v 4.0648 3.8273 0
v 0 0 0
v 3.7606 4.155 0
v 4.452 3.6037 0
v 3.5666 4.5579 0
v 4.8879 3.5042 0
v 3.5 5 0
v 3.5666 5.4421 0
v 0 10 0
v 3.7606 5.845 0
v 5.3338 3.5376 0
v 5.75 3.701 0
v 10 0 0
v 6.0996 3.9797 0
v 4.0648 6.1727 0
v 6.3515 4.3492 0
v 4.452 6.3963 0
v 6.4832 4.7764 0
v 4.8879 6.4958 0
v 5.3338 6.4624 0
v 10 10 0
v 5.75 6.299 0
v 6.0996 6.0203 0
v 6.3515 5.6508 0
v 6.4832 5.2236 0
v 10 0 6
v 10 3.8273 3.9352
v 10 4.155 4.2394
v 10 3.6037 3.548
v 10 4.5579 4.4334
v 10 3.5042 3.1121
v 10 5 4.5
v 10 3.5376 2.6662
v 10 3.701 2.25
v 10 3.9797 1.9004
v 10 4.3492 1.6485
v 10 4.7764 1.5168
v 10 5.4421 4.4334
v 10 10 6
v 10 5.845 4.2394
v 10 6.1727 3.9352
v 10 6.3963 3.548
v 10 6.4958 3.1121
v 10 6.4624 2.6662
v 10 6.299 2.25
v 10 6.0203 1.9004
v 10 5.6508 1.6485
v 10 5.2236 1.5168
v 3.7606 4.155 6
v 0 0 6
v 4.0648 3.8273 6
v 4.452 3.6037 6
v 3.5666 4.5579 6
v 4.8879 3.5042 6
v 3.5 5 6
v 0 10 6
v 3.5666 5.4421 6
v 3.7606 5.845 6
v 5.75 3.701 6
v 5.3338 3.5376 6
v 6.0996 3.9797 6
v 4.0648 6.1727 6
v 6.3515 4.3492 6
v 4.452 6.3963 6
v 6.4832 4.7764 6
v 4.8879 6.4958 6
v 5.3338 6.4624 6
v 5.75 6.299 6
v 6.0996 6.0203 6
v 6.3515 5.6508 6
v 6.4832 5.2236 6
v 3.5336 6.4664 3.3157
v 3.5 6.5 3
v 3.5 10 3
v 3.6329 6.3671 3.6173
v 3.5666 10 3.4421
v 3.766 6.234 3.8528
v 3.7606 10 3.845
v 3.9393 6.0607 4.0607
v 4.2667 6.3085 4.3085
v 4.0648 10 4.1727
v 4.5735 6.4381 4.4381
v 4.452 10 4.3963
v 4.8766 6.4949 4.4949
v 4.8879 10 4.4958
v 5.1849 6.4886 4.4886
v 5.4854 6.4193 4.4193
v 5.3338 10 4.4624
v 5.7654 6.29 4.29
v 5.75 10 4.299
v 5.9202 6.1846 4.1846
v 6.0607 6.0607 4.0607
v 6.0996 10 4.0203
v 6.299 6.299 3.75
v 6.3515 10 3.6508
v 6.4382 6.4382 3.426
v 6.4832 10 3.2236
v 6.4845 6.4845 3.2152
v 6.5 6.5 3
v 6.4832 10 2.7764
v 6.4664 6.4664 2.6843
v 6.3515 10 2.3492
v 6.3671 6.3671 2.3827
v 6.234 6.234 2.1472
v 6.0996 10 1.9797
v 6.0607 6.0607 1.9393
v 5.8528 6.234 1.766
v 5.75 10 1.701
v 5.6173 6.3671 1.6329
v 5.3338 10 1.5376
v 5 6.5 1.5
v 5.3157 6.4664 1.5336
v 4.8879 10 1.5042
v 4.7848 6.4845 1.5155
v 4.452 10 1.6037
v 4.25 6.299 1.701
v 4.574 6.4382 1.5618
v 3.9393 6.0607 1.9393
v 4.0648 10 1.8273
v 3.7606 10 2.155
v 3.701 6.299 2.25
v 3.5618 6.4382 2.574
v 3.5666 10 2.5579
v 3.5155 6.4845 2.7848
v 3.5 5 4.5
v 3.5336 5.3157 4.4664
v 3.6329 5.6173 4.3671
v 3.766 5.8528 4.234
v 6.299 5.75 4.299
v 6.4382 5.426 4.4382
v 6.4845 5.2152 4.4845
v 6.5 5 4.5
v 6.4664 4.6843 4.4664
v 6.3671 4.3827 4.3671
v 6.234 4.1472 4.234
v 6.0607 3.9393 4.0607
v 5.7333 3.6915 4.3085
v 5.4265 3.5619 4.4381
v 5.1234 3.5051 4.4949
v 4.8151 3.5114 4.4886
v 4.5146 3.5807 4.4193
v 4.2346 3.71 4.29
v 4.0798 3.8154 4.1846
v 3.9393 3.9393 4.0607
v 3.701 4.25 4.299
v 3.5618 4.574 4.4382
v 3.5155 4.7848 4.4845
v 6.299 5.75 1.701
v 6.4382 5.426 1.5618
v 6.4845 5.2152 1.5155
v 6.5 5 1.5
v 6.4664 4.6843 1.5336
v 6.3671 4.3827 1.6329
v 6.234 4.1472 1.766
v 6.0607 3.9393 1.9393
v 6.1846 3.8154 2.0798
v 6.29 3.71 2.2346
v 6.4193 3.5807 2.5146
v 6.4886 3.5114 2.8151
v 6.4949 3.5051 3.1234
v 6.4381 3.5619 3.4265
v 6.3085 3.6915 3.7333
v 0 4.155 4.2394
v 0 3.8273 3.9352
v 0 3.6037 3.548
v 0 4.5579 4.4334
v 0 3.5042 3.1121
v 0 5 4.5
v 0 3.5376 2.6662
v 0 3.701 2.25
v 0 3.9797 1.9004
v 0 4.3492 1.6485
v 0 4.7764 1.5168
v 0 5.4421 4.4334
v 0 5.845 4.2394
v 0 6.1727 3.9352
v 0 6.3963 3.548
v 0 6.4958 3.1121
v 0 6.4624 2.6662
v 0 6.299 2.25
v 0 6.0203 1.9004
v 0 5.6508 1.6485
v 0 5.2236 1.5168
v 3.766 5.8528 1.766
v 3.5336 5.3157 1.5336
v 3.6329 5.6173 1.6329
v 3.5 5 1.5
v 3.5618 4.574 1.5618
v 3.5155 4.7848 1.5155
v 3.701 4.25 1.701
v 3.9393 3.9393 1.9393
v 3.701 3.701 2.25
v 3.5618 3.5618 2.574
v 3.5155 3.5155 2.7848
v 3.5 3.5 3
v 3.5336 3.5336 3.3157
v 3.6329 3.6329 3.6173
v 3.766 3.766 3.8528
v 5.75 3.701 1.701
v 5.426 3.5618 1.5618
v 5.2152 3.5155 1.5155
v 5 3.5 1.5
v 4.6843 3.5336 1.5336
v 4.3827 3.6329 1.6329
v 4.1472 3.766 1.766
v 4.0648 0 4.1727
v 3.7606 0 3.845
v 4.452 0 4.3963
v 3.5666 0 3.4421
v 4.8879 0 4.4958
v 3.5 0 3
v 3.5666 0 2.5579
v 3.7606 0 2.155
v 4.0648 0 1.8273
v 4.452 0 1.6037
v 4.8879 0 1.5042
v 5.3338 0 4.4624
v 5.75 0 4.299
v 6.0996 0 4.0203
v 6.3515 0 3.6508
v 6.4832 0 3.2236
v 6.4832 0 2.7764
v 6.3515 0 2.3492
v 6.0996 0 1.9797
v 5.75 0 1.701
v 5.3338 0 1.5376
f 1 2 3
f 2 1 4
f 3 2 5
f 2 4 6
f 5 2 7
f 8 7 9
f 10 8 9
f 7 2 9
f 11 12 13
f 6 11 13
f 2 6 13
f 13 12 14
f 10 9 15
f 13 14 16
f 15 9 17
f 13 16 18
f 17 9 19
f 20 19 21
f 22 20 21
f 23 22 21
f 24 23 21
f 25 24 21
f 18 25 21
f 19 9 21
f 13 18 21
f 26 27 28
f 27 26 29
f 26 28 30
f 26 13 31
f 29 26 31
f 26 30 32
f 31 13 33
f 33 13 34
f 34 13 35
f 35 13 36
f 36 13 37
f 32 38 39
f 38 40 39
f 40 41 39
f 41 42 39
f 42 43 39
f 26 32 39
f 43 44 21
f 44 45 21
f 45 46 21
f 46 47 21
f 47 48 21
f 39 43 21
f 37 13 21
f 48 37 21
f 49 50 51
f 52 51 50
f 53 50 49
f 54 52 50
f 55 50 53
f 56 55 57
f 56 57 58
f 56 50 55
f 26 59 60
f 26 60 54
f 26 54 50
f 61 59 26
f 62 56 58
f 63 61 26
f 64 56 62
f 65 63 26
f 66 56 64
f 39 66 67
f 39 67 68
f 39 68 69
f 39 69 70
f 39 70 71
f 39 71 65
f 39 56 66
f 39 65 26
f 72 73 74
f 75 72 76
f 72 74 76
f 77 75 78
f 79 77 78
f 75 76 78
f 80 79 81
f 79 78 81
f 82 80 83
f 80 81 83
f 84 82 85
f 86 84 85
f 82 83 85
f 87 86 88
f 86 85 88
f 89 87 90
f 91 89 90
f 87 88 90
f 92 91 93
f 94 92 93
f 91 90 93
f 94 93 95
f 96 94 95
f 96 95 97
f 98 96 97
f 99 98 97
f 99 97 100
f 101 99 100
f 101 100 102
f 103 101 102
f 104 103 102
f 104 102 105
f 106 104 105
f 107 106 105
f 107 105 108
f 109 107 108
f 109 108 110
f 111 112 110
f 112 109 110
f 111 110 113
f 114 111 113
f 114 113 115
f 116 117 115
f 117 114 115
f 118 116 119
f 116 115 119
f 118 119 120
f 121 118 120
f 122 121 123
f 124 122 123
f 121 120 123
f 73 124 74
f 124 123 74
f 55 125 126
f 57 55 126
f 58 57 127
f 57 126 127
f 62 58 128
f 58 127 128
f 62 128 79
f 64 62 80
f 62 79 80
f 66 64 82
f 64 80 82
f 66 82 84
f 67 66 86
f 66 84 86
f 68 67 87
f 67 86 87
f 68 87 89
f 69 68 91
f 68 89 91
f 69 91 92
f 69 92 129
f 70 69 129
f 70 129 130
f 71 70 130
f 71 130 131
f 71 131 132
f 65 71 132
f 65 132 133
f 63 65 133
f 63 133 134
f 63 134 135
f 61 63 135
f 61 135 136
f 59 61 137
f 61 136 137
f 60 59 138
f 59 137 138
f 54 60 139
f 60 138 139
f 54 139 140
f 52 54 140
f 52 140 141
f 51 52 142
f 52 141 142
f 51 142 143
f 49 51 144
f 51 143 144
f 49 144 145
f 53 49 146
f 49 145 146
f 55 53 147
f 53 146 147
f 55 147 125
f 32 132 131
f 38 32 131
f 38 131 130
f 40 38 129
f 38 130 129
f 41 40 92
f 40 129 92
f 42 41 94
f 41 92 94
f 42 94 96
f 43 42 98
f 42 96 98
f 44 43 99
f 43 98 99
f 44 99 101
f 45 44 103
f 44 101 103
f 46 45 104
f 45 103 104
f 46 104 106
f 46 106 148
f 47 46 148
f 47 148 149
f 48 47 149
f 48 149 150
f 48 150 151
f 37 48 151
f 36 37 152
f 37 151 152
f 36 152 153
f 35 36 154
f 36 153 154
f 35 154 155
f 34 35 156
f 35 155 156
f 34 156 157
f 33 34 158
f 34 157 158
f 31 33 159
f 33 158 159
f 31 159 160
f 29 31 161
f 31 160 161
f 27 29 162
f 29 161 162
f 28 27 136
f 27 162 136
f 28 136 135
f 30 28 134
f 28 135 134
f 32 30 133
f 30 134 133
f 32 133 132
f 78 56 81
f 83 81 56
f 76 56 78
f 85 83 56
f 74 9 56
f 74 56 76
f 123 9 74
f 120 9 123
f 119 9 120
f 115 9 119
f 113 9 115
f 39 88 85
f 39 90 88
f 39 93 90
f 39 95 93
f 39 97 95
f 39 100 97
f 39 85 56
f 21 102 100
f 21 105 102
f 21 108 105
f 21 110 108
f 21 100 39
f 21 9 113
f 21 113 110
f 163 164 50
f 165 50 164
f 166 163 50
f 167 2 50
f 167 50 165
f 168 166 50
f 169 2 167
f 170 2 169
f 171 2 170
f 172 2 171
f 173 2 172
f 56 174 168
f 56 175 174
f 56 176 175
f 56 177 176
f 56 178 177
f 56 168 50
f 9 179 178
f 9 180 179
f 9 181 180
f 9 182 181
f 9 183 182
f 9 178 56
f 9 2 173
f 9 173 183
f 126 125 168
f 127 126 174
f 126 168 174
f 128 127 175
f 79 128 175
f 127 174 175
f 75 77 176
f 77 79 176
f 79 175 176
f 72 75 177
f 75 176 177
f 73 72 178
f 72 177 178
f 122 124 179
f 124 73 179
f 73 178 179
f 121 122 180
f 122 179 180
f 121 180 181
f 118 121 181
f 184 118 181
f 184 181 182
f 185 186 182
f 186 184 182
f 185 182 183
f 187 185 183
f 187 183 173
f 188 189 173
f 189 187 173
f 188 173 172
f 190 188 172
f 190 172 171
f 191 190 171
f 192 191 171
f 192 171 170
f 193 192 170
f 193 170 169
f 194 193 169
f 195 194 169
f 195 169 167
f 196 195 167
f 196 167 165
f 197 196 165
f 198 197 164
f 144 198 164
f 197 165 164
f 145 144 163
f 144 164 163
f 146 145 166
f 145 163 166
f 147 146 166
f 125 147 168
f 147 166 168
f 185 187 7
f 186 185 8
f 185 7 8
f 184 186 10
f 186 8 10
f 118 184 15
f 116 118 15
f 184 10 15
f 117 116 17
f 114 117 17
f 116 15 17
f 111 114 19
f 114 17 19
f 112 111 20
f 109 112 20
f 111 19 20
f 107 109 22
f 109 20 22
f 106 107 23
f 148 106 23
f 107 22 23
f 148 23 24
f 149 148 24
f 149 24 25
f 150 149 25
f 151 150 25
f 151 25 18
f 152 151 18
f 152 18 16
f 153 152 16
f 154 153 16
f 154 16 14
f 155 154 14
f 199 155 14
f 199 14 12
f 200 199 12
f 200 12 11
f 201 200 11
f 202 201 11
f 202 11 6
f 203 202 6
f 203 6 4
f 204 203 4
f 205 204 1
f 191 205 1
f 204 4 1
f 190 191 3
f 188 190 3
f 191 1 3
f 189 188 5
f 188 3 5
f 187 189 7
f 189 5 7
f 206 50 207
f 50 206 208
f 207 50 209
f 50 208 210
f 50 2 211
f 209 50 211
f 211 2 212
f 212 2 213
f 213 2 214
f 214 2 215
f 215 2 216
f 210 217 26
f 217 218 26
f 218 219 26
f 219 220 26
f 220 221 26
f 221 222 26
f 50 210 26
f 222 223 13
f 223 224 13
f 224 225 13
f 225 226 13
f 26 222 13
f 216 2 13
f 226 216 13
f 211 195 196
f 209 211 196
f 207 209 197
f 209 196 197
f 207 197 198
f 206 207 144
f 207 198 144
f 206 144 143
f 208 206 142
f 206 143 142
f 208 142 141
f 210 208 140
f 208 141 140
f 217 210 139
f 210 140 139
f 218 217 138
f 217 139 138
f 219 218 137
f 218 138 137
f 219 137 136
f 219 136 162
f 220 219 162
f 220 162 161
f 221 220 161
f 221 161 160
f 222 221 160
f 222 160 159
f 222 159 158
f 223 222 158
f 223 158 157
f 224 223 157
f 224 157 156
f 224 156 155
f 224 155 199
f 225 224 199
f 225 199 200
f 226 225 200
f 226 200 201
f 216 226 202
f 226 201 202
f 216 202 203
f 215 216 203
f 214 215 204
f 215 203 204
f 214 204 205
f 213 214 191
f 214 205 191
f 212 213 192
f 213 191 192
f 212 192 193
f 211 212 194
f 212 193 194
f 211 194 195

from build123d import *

# Parameters (mm, degrees)
SKETCH_1_W          = 10
SKETCH_1_H          = 10
EXTRUDE_1_DEPTH     = 6
SKETCH_2_R          = 1.5
CUT_EXTRUDE_1_DEPTH = 16.362291496
SKETCH_3_R          = 1.5
CUT_EXTRUDE_2_DEPTH = 16.362291496
SKETCH_4_R          = 1.5
CUT_EXTRUDE_3_DEPTH = 16.362291496


with BuildPart() as part:
    # 草图1 → 凸台-拉伸1 (new body)
    with BuildSketch(Plane.XY):
        with Locations((5, 5)):
            Rectangle(SKETCH_1_W, SKETCH_1_H)
    extrude(amount=EXTRUDE_1_DEPTH)

    # 草图2 → 切除-拉伸1 (cut, through all)
    with BuildSketch(Plane(origin=(0, 0, 0), x_dir=(-1, 0, 0), z_dir=(0, 0, -1))):
        with Locations((-5, 5)):
            Circle(SKETCH_2_R)
    extrude(amount=-CUT_EXTRUDE_1_DEPTH, mode=Mode.SUBTRACT)

    # 草图3 → 切除-拉伸2 (cut, through all)
    with BuildSketch(Plane(origin=(0, 10, 0), x_dir=(1, 0, 0), z_dir=(0, 1, 0))):
        with Locations(Location((5, -3, 0), (0, 0, 180))):
            Circle(SKETCH_3_R)
    extrude(amount=-CUT_EXTRUDE_2_DEPTH, mode=Mode.SUBTRACT)

    # 草图4 → 切除-拉伸3 (cut, through all)
    with BuildSketch(Plane.ZY):
        with Locations((3, 5)):
            Circle(SKETCH_4_R)
    extrude(amount=-CUT_EXTRUDE_3_DEPTH, mode=Mode.SUBTRACT)


solid = part.part
